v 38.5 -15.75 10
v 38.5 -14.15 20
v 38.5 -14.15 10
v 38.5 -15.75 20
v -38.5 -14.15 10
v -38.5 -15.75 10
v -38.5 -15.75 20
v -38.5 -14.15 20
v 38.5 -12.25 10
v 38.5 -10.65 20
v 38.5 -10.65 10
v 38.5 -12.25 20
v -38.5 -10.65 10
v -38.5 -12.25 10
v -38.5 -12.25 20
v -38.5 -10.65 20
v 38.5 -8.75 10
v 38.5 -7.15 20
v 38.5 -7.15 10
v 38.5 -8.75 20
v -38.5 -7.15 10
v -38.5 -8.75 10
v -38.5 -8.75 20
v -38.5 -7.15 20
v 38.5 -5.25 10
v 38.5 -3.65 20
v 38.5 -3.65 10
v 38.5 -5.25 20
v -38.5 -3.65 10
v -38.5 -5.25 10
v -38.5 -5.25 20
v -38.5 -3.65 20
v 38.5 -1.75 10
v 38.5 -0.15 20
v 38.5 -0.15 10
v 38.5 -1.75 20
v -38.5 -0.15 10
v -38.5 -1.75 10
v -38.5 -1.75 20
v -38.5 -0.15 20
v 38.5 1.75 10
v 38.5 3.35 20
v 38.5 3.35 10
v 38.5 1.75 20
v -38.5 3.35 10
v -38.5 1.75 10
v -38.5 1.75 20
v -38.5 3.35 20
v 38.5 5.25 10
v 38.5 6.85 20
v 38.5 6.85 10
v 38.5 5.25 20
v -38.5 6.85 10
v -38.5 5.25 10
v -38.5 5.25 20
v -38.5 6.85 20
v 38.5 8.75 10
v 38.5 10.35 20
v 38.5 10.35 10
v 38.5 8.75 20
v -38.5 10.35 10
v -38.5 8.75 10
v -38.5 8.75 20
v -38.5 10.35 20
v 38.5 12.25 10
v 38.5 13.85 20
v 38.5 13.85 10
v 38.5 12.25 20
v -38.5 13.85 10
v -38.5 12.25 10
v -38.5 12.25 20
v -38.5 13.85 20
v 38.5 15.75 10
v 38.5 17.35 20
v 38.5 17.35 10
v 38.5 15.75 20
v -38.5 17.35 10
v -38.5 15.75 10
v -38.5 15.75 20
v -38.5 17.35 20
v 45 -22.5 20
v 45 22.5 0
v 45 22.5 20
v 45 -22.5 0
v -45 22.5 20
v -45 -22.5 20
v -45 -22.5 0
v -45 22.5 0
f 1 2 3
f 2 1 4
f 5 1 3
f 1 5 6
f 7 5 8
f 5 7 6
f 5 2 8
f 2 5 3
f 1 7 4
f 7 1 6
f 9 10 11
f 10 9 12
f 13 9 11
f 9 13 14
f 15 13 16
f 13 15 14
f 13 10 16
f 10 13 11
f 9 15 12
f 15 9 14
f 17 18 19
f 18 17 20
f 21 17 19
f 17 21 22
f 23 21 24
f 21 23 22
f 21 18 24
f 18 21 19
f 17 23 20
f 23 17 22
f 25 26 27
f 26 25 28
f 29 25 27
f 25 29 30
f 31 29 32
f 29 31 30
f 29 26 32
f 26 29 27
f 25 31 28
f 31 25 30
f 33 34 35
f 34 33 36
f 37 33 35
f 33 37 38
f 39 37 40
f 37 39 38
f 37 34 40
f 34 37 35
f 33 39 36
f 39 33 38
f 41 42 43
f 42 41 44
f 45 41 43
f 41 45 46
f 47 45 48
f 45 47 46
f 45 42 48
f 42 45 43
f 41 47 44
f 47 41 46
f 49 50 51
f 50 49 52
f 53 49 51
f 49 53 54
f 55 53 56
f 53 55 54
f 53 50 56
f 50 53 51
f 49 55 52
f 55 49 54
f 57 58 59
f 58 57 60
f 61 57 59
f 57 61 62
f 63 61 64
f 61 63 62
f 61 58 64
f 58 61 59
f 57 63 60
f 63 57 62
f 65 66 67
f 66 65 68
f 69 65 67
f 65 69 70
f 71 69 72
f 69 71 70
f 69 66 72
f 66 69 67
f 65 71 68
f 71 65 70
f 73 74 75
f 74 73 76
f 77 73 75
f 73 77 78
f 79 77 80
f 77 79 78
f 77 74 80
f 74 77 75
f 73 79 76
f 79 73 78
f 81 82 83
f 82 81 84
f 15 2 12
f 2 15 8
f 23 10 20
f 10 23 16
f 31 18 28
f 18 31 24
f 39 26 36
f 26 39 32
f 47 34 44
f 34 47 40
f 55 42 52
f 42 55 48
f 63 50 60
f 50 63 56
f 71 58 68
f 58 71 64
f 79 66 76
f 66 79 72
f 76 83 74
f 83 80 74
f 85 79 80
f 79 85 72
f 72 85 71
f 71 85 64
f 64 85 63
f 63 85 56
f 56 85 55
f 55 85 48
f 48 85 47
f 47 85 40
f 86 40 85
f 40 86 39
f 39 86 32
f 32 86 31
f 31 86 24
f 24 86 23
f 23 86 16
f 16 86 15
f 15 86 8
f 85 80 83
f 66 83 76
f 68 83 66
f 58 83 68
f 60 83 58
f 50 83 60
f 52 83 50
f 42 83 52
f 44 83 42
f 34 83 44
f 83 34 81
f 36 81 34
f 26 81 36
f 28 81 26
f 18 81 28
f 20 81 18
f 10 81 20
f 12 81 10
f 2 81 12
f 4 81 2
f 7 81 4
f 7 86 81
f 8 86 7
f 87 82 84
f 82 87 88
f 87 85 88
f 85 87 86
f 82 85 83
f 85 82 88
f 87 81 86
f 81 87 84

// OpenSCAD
// Microscope slide drying rack
// Units: mm. Print orientation: base on XY plane, building up +Z.

// ---------------- Parameters ----------------
block_len    = 90;    // block length along X
block_wid    = 45;    // block width along Y
block_h      = 20;    // block height along Z

slot_count   = 10;    // number of slide slots
slot_len     = 77;    // slot length along X (slide length + clearance)
slot_w       = 1.6;   // slot width along Y (slide thickness + clearance)
slot_depth   = 10;    // slot depth from top face
slot_pitch   = 3.5;   // centre-to-centre slot spacing along Y

eps          = 0.5;   // overshoot for clean boolean cuts
$fn          = 64;    // curve resolution (no curves here; kept per convention)

// ---------------- Model ----------------
difference() {
    // Base block, centred in X and Y, resting on z = 0
    translate([-block_len/2, -block_wid/2, 0])
        cube([block_len, block_wid, block_h]);

    // Slot group, centred on the block in X and Y
    for (i = [0 : slot_count - 1]) {
        y = (i - (slot_count - 1)/2) * slot_pitch;
        translate([-slot_len/2, y, block_h - slot_depth])
            // Slot runs along X, open at the top face
            cube([slot_len, slot_w, slot_depth + eps]);
    }
}
